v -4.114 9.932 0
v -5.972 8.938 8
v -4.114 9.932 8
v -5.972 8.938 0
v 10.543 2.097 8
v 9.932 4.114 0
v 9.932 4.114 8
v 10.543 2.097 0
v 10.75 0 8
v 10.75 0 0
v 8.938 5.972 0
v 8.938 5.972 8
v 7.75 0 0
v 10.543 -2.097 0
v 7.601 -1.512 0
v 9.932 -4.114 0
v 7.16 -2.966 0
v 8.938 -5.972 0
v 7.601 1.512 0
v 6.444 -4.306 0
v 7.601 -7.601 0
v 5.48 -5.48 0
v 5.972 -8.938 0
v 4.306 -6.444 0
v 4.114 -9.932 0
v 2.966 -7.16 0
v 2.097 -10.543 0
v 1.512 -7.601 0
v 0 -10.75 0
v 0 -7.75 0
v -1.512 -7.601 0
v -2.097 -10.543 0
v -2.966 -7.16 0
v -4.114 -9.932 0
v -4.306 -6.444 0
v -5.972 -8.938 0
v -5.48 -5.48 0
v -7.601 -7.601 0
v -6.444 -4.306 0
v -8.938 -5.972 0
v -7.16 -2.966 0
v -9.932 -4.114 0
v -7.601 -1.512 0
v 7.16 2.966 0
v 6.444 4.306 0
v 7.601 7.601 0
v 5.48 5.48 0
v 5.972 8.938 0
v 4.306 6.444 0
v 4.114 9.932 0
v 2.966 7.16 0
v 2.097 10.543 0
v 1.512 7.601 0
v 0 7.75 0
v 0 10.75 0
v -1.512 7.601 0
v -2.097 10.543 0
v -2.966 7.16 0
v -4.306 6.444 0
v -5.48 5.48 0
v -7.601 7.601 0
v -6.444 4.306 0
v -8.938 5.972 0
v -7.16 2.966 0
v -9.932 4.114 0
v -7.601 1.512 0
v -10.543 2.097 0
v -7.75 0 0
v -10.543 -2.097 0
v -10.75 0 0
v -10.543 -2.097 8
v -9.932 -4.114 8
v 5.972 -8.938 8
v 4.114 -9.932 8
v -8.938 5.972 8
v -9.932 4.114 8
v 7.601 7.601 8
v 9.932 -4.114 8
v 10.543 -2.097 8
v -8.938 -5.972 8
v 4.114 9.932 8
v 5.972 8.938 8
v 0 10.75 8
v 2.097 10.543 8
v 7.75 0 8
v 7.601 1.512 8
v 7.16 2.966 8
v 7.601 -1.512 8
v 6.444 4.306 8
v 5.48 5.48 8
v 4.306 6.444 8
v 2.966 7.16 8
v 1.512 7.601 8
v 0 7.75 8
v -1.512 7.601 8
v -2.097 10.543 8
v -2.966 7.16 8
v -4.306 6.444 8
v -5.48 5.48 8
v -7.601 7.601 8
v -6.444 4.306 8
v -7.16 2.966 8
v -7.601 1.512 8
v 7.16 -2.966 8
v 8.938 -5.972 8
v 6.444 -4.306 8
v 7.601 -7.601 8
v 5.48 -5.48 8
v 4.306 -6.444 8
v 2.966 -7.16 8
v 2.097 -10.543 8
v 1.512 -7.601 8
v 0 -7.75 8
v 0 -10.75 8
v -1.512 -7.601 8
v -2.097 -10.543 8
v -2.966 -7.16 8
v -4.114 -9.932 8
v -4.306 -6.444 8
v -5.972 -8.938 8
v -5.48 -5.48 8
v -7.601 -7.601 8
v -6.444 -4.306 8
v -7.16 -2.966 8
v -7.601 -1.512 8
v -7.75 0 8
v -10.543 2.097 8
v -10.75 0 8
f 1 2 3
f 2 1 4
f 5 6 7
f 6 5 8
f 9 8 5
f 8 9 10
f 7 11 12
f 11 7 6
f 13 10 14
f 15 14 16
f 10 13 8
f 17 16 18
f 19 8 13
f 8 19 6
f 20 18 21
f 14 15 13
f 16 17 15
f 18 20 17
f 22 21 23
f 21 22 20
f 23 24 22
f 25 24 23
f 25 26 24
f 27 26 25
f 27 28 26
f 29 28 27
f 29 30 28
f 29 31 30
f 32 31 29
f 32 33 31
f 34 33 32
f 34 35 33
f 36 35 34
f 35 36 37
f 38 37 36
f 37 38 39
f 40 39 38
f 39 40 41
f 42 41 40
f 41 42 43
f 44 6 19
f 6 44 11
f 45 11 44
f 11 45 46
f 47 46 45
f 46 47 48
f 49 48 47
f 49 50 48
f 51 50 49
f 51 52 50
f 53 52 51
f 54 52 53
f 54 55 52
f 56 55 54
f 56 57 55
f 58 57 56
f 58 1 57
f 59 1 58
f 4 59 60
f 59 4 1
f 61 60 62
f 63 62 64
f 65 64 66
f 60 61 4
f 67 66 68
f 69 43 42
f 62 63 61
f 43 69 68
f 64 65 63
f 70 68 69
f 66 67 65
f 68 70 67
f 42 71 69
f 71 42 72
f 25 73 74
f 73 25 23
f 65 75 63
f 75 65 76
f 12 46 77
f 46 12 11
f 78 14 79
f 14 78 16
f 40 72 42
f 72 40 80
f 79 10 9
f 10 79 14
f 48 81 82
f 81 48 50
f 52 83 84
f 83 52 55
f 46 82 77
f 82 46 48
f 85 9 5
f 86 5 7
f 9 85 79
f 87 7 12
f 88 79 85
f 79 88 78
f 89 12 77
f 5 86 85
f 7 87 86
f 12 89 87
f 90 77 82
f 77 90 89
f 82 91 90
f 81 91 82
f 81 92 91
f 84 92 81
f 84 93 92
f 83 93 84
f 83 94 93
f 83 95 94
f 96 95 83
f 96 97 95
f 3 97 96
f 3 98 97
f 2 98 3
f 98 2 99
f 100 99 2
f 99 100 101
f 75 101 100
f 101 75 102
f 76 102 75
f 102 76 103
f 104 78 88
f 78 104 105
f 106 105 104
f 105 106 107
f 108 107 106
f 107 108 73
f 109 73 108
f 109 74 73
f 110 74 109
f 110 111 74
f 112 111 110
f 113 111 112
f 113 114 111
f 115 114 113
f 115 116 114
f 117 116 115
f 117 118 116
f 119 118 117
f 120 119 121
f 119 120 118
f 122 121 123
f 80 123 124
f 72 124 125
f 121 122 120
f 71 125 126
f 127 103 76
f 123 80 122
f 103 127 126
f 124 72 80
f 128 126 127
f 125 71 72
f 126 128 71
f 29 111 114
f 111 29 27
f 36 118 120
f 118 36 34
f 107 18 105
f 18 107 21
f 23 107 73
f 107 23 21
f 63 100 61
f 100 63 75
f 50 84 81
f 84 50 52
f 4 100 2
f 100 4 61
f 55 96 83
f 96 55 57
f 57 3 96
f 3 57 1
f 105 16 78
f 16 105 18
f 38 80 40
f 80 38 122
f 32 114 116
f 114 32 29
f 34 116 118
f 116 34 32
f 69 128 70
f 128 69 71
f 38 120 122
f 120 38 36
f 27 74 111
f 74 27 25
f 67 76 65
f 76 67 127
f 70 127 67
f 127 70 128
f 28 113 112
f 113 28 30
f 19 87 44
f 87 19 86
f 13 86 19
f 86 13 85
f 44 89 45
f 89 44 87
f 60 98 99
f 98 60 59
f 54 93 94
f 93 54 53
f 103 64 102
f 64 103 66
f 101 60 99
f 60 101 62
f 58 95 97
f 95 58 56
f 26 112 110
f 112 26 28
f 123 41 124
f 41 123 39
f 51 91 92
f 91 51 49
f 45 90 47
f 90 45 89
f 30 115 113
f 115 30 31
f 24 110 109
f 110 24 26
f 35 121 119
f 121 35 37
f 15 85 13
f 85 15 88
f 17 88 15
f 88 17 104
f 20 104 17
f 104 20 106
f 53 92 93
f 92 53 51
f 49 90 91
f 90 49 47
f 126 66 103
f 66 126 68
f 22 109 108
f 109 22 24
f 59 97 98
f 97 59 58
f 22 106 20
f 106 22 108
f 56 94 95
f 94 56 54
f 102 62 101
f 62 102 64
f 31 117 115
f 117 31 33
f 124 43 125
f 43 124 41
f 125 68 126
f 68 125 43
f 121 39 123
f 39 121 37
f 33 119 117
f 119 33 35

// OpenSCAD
$fn = 32;

// ----------------------------------------------------------------------
// Spacer sleeve: 21.5 / 15.5 x 8 mm
// ----------------------------------------------------------------------

// --- parameters (mm) ---
tube_d = 21.5;            // outside diameter
bore_d = 15.5;            // shaft bore
tube_l = 8;               // sleeve length
step_d = 20;              // reduced diameter
step_l = 3.04;            // length of the step

module sleeve() {
  cylinder(h = tube_l, d = tube_d);
  translate([0, 0, tube_l - step_l]) cylinder(h = step_l, d = step_d);
}

difference() {
  sleeve();
  translate([0, 0, -1]) cylinder(h = tube_l + 2, d = bore_d);
}
